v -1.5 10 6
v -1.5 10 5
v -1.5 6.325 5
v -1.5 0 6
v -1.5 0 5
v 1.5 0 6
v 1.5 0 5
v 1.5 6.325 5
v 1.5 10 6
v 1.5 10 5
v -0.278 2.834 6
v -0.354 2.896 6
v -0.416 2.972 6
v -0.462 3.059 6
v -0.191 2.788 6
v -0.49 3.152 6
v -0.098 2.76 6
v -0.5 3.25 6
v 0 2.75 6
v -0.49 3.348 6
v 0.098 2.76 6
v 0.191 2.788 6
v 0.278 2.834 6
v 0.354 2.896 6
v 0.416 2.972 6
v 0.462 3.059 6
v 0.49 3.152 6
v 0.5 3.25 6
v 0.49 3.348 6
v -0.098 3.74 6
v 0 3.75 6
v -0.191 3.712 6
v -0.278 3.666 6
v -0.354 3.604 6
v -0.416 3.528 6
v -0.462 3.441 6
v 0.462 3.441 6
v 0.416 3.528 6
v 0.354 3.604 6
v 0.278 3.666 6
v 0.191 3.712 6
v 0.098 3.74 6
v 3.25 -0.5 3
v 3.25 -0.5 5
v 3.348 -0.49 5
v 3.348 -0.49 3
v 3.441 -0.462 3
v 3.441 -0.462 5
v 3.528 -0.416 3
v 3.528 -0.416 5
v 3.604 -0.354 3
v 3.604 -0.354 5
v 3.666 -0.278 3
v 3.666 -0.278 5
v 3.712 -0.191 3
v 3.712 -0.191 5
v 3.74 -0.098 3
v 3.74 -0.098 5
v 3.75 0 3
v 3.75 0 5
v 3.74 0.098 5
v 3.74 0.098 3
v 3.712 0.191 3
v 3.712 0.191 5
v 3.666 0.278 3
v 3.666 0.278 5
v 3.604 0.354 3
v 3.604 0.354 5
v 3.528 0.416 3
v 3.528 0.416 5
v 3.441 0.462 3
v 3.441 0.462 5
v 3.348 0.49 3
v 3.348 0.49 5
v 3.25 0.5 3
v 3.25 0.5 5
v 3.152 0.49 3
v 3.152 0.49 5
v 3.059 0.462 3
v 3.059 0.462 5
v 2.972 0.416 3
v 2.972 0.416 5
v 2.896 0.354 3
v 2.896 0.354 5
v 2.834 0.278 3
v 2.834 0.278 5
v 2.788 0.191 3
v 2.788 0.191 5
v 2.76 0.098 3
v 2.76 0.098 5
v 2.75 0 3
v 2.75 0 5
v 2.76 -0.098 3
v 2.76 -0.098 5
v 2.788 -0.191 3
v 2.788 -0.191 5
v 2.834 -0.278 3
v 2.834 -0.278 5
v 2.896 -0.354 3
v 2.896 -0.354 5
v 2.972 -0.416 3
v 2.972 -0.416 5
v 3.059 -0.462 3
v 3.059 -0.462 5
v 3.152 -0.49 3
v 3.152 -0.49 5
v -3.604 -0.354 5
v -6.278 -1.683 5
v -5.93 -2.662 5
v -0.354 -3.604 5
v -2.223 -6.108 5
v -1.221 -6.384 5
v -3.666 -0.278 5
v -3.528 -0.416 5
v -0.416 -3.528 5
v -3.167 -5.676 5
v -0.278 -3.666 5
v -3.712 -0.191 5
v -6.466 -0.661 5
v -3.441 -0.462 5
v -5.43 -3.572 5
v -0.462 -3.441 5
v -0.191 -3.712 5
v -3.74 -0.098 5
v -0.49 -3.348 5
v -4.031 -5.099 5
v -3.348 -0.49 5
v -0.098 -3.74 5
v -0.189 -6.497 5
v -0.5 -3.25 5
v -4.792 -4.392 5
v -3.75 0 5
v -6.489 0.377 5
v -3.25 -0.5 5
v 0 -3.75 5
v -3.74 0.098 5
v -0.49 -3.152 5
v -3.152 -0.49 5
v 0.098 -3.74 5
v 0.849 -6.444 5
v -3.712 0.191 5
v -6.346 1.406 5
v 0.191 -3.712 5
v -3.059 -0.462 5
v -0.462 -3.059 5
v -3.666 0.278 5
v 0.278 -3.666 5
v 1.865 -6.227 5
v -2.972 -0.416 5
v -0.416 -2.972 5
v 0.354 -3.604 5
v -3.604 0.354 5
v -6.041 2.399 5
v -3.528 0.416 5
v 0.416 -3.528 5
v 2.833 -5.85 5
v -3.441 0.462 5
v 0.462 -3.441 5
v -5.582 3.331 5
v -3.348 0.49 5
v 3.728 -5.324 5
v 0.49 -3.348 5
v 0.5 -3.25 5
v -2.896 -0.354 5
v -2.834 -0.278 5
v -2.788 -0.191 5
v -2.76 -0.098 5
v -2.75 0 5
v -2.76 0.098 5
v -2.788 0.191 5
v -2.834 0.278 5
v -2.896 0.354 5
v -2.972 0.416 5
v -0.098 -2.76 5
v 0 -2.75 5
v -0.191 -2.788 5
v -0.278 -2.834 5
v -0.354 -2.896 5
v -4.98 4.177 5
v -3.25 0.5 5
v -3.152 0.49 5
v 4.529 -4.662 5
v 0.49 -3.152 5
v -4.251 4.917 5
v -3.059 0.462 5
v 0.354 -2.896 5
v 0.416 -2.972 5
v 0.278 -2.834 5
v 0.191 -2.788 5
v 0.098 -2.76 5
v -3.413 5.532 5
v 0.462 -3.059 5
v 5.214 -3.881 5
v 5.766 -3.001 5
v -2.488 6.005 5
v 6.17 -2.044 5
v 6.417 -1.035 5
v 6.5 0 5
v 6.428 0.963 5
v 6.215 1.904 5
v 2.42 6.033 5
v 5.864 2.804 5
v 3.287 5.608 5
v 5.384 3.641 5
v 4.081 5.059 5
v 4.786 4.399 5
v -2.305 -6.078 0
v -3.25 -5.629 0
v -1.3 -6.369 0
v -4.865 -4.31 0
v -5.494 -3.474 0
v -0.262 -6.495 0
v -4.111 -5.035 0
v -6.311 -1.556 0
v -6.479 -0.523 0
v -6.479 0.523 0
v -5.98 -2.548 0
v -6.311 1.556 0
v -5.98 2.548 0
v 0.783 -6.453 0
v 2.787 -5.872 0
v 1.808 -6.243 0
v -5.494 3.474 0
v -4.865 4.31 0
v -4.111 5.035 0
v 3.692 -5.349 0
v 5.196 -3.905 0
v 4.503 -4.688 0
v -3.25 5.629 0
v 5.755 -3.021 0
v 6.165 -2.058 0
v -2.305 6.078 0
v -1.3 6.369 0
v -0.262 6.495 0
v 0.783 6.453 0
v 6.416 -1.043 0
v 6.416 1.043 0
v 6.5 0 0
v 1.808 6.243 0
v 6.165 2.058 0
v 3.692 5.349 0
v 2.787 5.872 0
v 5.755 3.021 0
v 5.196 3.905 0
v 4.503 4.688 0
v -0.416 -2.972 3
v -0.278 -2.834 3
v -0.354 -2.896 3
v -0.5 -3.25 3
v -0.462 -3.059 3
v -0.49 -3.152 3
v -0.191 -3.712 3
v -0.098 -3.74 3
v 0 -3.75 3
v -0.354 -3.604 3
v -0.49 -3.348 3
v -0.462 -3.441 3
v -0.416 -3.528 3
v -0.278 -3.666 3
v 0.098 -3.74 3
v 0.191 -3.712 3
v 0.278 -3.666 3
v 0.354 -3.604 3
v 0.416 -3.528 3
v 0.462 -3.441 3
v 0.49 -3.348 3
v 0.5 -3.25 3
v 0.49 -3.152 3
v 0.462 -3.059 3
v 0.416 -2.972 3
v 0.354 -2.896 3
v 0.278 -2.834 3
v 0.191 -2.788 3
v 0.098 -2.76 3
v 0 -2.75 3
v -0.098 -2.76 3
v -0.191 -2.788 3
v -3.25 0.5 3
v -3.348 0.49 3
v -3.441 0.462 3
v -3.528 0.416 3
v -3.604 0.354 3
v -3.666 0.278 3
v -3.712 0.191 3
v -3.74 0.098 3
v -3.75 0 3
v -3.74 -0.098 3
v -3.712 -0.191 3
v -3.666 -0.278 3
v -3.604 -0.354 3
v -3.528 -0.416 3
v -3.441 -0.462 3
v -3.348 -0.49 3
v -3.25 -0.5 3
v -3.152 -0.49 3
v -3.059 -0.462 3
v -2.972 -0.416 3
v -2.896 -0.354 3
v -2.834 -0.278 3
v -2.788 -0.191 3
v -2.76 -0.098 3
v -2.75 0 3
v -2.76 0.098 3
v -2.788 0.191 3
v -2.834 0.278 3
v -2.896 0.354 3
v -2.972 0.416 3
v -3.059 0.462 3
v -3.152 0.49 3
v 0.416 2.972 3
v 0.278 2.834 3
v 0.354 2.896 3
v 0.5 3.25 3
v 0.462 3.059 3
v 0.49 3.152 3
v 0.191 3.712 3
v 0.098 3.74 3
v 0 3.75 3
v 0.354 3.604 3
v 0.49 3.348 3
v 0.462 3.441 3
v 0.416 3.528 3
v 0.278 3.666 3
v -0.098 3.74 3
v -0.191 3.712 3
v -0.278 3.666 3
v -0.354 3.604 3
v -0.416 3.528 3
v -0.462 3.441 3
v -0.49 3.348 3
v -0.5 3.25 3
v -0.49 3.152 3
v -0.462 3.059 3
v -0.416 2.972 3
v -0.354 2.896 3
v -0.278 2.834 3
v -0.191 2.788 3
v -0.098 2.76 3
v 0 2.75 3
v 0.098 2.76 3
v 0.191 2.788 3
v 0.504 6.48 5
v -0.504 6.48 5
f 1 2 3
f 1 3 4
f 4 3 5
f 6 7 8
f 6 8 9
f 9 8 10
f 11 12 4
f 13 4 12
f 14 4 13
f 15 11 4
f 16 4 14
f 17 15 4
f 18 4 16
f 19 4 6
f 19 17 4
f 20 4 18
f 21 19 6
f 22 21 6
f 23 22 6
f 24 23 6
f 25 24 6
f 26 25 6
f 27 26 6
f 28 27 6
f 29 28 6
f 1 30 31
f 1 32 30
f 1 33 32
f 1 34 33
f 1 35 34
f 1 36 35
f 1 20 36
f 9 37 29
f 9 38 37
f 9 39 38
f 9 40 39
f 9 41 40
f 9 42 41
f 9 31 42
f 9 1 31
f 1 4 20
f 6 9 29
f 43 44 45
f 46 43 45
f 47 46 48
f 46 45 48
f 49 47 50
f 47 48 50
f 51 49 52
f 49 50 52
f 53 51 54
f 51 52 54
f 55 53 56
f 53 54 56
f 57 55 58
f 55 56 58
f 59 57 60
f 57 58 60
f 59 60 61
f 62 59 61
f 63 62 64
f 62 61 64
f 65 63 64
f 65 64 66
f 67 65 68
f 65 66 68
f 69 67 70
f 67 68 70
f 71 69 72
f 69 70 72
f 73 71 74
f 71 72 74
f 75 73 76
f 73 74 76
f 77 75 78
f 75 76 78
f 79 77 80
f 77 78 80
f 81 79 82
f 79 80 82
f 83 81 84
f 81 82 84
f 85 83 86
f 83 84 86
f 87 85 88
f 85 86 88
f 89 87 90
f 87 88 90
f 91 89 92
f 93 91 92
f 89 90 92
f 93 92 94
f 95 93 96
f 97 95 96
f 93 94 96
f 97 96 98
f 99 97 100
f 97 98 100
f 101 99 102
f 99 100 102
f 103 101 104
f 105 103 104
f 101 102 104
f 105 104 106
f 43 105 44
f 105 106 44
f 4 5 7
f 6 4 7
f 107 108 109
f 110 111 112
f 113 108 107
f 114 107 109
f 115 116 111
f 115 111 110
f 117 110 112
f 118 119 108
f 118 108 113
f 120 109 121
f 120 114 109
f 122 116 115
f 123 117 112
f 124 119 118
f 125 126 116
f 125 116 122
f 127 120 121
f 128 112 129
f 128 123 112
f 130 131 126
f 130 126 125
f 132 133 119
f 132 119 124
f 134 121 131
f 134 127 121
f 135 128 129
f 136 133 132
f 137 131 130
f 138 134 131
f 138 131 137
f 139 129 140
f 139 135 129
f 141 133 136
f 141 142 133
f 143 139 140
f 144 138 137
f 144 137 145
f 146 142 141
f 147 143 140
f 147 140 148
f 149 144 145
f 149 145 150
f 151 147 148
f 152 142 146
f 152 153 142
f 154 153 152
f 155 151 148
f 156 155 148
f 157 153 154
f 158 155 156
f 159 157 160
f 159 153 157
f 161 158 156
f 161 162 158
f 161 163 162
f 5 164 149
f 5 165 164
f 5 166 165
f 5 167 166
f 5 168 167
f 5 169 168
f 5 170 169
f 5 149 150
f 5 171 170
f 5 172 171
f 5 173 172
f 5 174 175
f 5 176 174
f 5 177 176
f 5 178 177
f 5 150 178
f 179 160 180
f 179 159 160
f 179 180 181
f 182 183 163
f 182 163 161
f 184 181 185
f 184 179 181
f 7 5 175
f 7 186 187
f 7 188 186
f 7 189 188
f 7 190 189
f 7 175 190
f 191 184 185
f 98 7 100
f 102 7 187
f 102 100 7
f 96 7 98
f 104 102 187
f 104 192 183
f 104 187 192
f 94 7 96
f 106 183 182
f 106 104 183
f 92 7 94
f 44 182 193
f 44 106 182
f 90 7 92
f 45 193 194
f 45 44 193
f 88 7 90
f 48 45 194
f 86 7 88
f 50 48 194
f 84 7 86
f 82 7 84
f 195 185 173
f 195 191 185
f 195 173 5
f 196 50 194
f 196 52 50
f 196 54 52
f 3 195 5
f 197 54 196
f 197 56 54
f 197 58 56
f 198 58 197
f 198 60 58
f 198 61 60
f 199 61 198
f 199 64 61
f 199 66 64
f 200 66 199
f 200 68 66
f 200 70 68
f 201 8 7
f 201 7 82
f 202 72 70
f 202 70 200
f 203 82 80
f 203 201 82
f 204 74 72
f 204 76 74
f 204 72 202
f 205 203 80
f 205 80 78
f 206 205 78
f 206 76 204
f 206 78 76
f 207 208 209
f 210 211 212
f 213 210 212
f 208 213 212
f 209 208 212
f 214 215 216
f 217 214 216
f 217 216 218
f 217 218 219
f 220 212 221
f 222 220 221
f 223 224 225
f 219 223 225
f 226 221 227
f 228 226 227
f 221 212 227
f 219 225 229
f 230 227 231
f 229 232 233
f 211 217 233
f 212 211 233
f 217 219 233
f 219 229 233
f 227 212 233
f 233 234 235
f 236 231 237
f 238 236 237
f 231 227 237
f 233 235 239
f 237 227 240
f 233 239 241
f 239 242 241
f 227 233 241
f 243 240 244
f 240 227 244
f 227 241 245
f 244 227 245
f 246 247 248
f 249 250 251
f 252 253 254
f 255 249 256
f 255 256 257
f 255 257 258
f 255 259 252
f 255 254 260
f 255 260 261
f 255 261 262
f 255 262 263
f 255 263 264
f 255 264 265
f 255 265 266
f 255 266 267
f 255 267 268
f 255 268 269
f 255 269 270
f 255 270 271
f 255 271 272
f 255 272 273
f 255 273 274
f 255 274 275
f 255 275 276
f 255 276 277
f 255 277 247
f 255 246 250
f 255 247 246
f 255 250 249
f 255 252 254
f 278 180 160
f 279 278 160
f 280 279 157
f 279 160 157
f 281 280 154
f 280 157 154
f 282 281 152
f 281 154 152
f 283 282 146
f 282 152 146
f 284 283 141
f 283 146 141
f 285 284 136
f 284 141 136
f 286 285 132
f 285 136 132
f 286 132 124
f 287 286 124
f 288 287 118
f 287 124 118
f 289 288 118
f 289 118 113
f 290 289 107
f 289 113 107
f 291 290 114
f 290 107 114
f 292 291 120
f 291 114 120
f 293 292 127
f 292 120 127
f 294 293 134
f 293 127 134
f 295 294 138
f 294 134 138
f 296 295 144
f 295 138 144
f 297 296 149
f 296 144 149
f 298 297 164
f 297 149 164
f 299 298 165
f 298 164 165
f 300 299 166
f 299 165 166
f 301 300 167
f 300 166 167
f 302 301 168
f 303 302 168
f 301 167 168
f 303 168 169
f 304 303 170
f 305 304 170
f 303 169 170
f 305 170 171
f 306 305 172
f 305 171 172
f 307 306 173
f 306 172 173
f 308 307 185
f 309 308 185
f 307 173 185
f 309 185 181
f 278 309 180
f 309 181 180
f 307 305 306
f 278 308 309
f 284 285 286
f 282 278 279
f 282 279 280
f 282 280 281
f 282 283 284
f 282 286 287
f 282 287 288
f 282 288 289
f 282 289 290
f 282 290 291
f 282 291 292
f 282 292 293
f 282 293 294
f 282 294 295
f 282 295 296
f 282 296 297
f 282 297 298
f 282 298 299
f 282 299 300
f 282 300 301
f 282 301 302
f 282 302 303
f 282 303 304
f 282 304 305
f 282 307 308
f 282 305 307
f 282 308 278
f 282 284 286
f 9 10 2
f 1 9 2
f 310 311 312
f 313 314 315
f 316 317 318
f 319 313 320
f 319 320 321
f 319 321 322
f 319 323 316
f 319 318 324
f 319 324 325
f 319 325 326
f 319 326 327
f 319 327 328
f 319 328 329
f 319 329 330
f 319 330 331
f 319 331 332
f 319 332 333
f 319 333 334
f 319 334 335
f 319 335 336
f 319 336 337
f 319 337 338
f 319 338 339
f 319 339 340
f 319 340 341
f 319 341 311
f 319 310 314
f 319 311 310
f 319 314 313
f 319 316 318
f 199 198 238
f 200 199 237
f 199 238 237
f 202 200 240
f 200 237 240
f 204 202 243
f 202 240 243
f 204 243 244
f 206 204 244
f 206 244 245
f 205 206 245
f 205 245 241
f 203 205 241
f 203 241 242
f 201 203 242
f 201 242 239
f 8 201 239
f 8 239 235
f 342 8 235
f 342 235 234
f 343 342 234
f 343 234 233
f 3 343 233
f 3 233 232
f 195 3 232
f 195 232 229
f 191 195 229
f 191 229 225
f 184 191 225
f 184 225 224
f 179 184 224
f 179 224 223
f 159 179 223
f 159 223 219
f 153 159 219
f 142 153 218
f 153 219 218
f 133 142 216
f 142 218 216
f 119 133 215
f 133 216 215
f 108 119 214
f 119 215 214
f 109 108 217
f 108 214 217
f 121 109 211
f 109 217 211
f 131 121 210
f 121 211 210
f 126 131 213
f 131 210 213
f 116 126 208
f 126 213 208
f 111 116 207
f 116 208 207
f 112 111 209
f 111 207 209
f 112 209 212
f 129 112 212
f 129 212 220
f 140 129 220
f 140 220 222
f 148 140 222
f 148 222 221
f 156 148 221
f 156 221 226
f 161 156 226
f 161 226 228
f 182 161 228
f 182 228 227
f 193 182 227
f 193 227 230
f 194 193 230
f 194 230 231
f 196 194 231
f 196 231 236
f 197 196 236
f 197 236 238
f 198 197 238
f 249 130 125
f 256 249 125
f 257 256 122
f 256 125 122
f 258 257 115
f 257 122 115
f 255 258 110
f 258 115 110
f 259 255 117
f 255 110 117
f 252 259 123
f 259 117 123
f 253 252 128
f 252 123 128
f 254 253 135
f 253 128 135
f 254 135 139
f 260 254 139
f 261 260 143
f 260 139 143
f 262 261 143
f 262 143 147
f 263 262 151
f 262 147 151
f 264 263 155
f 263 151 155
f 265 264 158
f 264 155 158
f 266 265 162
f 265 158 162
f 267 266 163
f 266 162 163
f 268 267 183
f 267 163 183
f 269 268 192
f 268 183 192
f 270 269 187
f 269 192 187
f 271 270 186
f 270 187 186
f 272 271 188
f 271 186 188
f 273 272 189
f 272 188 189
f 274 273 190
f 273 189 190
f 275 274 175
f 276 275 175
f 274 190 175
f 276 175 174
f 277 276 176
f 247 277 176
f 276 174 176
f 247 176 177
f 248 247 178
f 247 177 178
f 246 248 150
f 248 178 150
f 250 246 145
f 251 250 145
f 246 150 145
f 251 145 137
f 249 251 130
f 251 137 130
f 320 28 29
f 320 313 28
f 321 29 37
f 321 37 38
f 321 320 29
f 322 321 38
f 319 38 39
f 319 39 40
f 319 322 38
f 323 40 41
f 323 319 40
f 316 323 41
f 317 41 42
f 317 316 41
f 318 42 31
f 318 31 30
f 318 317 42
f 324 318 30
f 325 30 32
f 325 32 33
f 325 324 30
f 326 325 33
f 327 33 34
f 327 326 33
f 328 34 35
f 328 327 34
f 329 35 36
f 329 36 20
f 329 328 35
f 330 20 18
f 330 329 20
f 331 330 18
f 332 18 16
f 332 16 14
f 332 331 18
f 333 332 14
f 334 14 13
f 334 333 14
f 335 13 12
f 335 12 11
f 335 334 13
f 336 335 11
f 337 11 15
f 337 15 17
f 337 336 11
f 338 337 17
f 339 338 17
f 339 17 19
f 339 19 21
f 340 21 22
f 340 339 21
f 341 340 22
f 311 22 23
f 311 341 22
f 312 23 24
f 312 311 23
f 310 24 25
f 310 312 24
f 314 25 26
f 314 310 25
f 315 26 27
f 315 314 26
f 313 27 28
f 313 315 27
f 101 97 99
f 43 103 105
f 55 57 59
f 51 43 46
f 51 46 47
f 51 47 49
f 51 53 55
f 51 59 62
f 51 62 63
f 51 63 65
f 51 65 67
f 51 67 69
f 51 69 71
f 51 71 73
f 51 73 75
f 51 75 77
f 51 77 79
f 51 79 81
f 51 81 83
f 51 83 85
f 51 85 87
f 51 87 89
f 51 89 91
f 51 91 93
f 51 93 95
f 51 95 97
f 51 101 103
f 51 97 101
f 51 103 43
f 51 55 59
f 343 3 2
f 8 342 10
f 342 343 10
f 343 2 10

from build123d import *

# Parameters (mm, degrees)
F0_R            = 6.5
F1_DEPTH        = 5
F2_R            = 0.5
F3_DEPTH        = 2
F3_COPIES_COUNT = 4
F4_R            = 0.5
F5_DEPTH        = 1


# Not quite as in the source:
# - a pattern or mirror of a feature is missing from the dataset's text; its kind, count and spacing are read off the source's solid


with BuildPart() as f1:
    # F0 (on Top) → F1 (new body)
    with BuildSketch(Plane.XY):
        Circle(F0_R)
    extrude(amount=F1_DEPTH)

    # F2 (on face) → F3 (cut)
    with BuildSketch(Plane.XY.offset(5)):
        with Locations((0, 3.25)):
            Circle(F2_R)
    f3 = extrude(amount=-F3_DEPTH, mode=Mode.SUBTRACT)

    # F3_copies: F3 ×4 about axis
    f3_copies_axis = Axis((0, 0, 0), (0, 0, 1))
    for i in range(1, F3_COPIES_COUNT):
        add(f3.rotate(f3_copies_axis, i * 360 / F3_COPIES_COUNT), mode=Mode.SUBTRACT)

    # F4 (on face) → F5 (join)
    with BuildSketch(Plane.XY.offset(5)):
        with BuildLine():
            Line((-1.5, 10), (-1.5, 6.3245553203))
            ThreePointArc((-1.5, 6.3245553203), (0, 6.5), (1.5, 6.3245553203))
            Line((1.5, 6.3245553203), (1.5, 10))
            Line((1.5, 10), (-1.5, 10))
        make_face()
        with BuildLine():
            Line((-1.5, 6.3245553203), (-1.5, 0))
            Line((-1.5, 0), (1.5, 0))
            Line((1.5, 0), (1.5, 6.3245553203))
            ThreePointArc((1.5, 6.3245553203), (0, 6.5), (-1.5, 6.3245553203))
        make_face()
        with Locations((0, 3.25)):
            Circle(F4_R, mode=Mode.SUBTRACT)
    extrude(amount=F5_DEPTH)


solid = f1.part
